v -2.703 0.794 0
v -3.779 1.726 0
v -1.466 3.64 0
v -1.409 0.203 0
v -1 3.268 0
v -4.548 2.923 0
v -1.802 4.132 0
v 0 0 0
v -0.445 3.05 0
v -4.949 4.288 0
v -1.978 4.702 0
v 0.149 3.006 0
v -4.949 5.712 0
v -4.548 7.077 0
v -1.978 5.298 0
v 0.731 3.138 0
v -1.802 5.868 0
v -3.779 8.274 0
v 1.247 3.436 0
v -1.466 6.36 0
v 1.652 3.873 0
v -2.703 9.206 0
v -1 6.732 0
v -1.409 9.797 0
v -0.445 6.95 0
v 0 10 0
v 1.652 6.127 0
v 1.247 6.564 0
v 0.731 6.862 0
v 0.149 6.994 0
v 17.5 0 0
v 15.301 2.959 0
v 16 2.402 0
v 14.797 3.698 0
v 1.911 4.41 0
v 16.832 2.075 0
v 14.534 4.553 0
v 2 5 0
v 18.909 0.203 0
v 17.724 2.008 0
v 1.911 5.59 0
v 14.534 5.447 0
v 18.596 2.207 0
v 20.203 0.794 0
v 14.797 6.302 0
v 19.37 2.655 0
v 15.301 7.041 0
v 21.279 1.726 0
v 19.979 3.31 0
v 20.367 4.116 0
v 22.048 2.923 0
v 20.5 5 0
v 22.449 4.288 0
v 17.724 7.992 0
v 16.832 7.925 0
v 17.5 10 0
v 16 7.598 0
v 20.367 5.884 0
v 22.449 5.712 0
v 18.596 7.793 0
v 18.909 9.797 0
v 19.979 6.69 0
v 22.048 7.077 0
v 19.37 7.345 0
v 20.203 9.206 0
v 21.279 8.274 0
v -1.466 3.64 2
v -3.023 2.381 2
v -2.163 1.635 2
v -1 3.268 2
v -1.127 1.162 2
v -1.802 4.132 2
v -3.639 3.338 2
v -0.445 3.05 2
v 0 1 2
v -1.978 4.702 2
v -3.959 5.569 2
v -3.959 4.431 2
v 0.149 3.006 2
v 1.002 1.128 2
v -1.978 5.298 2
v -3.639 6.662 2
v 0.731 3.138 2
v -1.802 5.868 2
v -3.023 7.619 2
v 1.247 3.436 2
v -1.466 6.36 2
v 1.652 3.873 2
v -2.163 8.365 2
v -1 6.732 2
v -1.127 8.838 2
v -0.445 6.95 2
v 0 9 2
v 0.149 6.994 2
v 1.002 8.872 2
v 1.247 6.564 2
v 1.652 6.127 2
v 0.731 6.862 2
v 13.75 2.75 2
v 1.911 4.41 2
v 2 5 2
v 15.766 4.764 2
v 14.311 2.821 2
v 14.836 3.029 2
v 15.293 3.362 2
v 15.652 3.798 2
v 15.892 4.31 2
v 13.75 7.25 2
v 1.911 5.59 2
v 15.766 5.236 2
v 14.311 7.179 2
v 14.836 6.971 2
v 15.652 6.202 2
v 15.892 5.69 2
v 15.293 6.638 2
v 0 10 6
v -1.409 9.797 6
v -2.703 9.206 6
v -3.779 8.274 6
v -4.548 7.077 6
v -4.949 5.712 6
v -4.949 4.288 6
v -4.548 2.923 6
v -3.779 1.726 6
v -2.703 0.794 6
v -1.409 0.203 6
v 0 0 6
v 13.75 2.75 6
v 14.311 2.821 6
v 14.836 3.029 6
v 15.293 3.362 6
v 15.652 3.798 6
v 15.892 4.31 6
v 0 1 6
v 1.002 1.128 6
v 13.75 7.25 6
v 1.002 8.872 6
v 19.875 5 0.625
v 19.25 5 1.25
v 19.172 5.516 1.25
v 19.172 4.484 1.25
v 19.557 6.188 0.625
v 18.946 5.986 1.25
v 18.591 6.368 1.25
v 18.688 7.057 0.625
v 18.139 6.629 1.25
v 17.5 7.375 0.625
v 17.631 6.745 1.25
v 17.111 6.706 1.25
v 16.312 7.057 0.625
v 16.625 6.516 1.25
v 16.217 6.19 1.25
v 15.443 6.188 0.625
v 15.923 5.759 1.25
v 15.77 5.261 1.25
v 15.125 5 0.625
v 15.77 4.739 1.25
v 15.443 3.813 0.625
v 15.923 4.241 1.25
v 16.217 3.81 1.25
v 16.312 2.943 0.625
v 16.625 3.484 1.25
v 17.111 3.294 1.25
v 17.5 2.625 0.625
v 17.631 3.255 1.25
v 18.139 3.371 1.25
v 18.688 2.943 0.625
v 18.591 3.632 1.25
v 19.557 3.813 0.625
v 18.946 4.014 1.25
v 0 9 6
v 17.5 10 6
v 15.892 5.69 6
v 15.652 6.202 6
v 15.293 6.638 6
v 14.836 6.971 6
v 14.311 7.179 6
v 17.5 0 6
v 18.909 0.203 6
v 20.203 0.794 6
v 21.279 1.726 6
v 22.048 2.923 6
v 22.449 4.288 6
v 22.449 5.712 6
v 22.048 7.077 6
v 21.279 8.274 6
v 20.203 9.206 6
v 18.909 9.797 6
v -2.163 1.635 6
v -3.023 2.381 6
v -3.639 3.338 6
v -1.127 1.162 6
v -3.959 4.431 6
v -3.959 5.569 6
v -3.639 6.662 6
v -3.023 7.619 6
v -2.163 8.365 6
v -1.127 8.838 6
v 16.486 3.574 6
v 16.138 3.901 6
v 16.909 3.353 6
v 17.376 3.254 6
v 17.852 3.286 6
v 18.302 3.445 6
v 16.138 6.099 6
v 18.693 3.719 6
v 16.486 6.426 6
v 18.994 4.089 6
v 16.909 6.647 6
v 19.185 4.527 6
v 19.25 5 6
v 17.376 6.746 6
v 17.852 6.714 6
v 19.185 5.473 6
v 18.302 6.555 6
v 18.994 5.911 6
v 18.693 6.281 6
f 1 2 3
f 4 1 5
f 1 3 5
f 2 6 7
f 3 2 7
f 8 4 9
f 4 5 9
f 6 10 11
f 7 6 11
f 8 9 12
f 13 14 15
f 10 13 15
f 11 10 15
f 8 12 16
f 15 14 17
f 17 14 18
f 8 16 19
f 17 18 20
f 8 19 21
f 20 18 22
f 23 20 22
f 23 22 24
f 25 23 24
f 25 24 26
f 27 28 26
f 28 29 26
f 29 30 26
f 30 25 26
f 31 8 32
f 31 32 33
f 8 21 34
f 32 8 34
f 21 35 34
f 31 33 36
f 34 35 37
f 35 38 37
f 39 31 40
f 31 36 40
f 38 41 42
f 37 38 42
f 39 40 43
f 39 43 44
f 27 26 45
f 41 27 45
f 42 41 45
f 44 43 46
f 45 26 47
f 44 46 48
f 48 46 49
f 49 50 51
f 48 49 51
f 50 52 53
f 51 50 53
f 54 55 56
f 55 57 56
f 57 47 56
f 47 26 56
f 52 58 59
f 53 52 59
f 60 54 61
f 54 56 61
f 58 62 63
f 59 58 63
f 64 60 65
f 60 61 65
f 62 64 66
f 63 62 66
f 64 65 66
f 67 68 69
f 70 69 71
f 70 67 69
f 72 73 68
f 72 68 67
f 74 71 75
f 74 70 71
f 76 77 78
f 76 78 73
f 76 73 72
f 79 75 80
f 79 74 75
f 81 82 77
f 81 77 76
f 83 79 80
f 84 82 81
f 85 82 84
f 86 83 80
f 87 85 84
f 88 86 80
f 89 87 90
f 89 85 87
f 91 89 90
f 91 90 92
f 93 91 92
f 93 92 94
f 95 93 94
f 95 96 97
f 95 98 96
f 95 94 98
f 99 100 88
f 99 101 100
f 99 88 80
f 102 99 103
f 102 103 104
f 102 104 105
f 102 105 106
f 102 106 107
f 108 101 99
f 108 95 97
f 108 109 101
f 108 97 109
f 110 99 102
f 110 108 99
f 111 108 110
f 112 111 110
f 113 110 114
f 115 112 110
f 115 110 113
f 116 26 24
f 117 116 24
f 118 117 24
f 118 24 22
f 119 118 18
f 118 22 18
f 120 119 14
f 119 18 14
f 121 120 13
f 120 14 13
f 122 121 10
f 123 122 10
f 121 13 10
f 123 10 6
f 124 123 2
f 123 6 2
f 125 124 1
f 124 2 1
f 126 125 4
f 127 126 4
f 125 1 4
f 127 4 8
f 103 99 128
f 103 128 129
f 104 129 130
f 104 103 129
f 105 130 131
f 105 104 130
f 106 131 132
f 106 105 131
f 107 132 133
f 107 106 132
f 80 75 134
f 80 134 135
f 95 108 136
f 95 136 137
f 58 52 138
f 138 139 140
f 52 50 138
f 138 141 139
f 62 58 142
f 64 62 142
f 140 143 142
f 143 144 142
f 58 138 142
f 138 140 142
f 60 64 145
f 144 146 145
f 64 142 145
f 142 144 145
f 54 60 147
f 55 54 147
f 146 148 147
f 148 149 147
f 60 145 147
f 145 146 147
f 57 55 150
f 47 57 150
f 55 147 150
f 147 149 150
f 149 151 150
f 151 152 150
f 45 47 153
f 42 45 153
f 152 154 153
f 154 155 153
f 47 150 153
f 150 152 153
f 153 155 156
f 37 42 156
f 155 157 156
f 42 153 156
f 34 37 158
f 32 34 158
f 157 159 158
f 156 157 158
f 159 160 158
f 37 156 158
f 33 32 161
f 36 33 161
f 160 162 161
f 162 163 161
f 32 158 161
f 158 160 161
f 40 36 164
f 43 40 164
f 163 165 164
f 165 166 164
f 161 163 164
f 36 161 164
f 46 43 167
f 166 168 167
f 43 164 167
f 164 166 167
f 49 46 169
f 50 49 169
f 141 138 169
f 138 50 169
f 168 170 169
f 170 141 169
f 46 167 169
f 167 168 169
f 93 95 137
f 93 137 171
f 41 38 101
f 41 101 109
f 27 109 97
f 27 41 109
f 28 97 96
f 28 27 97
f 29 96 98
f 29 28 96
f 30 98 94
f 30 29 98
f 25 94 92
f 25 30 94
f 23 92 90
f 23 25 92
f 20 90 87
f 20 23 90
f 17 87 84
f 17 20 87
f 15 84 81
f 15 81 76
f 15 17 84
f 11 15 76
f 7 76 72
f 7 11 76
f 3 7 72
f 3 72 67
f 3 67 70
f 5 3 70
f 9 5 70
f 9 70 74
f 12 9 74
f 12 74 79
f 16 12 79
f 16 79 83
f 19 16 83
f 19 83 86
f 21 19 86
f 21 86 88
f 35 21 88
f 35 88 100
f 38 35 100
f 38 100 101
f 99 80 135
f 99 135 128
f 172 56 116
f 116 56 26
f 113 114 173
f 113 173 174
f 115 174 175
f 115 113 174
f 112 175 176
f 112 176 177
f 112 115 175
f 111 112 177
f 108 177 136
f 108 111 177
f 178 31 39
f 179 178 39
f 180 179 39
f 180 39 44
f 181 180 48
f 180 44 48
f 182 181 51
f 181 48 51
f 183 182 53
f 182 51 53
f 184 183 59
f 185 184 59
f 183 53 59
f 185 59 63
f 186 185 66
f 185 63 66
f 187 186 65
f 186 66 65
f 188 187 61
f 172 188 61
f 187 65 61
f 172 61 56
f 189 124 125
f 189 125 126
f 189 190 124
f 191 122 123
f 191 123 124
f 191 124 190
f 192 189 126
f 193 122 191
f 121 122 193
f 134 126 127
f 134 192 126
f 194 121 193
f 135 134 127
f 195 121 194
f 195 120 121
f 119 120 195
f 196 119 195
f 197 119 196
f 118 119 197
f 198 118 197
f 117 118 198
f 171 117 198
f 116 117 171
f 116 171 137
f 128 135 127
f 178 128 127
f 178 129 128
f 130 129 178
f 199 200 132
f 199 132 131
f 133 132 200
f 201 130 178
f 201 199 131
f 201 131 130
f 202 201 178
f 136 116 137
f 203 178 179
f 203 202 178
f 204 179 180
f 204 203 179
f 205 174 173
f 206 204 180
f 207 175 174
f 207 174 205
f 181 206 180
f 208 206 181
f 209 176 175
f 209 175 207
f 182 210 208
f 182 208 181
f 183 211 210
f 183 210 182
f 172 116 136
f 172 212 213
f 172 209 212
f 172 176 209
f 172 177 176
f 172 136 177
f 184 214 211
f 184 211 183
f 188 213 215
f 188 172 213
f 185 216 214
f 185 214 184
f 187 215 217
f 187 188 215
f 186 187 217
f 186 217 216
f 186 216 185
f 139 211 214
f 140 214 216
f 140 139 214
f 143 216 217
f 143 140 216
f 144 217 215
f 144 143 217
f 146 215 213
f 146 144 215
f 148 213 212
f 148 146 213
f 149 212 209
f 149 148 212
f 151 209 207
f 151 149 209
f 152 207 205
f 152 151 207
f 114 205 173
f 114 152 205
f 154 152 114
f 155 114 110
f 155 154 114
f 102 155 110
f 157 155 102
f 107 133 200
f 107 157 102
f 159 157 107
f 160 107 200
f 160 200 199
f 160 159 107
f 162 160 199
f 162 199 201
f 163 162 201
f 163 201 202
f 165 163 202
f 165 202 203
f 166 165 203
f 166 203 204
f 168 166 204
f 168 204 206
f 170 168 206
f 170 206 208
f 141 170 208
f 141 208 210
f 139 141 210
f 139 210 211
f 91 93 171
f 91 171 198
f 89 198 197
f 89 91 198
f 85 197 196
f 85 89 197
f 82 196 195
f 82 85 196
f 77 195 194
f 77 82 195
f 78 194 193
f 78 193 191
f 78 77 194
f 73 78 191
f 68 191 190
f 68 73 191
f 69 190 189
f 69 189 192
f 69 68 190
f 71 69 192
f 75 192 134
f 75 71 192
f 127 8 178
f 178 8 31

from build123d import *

# Parameters (mm, degrees)
ESQUISSE1_R             = 2
ESQUISSE1_R_2           = 1.75
BOSS_EXTRU_1_DEPTH      = 6
ENL_V_START             = -4
ESQUISSE2_R             = 2
ENL_V_MAT_EXTRU_1_DEPTH = 4
CHANFREIN2_SIZE         = 1.25


with BuildPart() as part:
    # Esquisse1 → Boss.-Extru.1 (new body)
    with BuildSketch(Plane.XY):
        with BuildLine():
            Line((0, 0), (17.5, 0))
            ThreePointArc((17.5, 0), (22.5, 5), (17.5, 10))
            Line((17.5, 10), (0, 10))
            ThreePointArc((0, 10), (-5, 5), (0, 0))
        make_face()
        with Locations((0, 5)):
            Circle(ESQUISSE1_R, mode=Mode.SUBTRACT)
        with Locations((17.5, 5)):
            Circle(ESQUISSE1_R_2, mode=Mode.SUBTRACT)
    extrude(amount=BOSS_EXTRU_1_DEPTH)

    # Esquisse2 → Enlèv. mat.-Extru.1 (cut)
    with BuildSketch(Plane.XY.offset(6).offset(ENL_V_START)):
        with BuildLine():
            Line((1.001951854, 8.872478855), (0, 9))
            ThreePointArc((0, 9), (-4, 5), (0, 1))
            Line((0, 1), (1.001951854, 1.127521145))
            Line((1.001951854, 1.127521145), (13.75, 2.75))
            ThreePointArc((13.75, 2.75), (15.07486756, 3.181421998), (15.891666667, 4.310243602))
            ThreePointArc((15.891666667, 4.310243602), (15.75, 5), (15.891666667, 5.689756398))
            ThreePointArc((15.891666667, 5.689756398), (15.07486756, 6.818578002), (13.75, 7.25))
            Line((13.75, 7.25), (1.001951854, 8.872478855))
        make_face()
        with Locations((0, 5)):
            Circle(ESQUISSE2_R, mode=Mode.SUBTRACT)
    extrude(amount=ENL_V_MAT_EXTRU_1_DEPTH, mode=Mode.SUBTRACT)

    # Chanfrein2
    chanfrein2_edges = [part.edges().sort_by_distance(p)[0] for p in [
        (15.75, 5, 0),
    ]]
    chamfer(chanfrein2_edges, length=CHANFREIN2_SIZE)


solid = part.part
